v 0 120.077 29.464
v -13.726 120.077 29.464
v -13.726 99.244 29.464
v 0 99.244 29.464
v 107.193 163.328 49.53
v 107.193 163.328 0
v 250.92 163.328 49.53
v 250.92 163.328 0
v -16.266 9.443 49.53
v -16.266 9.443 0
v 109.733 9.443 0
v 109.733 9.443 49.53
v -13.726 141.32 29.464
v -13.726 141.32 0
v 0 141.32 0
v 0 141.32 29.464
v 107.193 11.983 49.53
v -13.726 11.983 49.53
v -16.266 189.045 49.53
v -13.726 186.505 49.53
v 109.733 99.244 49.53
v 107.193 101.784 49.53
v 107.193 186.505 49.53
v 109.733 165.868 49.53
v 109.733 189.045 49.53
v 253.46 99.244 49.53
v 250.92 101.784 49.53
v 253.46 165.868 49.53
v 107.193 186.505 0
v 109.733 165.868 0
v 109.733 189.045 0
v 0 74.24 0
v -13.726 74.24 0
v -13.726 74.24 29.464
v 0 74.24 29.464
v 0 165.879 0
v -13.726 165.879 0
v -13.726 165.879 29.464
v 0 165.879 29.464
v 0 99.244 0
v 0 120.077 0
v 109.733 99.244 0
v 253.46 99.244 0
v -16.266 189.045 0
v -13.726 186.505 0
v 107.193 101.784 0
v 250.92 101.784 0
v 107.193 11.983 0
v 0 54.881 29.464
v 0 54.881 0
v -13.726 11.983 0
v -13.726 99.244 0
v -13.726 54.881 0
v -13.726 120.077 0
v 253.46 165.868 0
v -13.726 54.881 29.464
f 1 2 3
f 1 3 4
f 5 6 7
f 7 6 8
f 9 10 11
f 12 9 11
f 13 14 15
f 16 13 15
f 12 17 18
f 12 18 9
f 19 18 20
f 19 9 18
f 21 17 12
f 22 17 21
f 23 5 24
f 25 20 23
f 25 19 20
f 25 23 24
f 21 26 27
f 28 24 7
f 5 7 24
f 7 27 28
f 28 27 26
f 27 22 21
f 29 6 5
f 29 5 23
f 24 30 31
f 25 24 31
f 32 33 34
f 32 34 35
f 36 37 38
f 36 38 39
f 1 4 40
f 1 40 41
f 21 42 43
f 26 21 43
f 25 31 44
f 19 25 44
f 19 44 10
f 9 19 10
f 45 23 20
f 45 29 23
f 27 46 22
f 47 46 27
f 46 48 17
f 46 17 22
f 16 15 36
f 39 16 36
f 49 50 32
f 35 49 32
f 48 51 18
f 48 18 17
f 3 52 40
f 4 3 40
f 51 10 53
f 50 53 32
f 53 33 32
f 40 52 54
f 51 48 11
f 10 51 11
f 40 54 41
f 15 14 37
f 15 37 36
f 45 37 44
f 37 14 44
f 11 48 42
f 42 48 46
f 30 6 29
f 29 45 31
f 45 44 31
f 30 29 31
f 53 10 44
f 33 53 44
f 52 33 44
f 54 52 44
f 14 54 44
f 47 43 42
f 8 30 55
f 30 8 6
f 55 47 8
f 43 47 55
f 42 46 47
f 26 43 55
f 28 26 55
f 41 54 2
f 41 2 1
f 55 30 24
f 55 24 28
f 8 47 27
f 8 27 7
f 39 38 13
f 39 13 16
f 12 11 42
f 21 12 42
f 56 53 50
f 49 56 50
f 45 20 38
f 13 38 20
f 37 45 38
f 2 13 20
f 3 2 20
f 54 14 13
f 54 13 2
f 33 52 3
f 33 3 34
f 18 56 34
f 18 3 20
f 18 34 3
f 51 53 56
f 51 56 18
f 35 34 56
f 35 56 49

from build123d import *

# Parameters (mm, degrees)
F0_W     = 143.7272205949
F0_H     = 66.6242633015
F1_DEPTH = 49.53
F2_T     = -2.54
F3_W     = 13.7264372474
F3_H     = 19.3594098091
F3_H_2   = 20.8327490836
F3_H_3   = 24.5586633682
F4_DEPTH = 29.464


with BuildPart() as f1:
    # F0 (on Top) → F1 (new body)
    with BuildSketch(Plane.XY):
        Polygon((-16.2664372474, 189.0449970961), (-16.2664372474, 9.442742914), (109.7329184413, 9.442742914), (109.7329184413, 99.243870005), (109.7329184413, 165.8681333065), (109.7329184413, 189.0449970961), align=None)
        with Locations((181.5965287387, 132.5560016558)):
            Rectangle(F0_W, F0_H)
    extrude(amount=F1_DEPTH)

    # F2
    f2_openings = [f1.faces().sort_by_distance(p)[0] for p in [
        (86.832403, 109.148631, 49.53),
        (86.832403, 109.148631, 0),
    ]]
    offset(amount=F2_T, openings=f2_openings, kind=Kind.INTERSECTION)

    # F3 (on Top) → F4 (join)
    with BuildSketch(Plane.XY):
        with Locations((-6.8632186237, 64.5605772734)):
            Rectangle(F3_W, F3_H)
        with Locations((-6.8632186237, 109.6602445468)):
            Rectangle(F3_W, F3_H_2)
        with Locations((-6.8632186237, 153.5996198654)):
            Rectangle(F3_W, F3_H_3)
    extrude(amount=F4_DEPTH)


solid = f1.part
